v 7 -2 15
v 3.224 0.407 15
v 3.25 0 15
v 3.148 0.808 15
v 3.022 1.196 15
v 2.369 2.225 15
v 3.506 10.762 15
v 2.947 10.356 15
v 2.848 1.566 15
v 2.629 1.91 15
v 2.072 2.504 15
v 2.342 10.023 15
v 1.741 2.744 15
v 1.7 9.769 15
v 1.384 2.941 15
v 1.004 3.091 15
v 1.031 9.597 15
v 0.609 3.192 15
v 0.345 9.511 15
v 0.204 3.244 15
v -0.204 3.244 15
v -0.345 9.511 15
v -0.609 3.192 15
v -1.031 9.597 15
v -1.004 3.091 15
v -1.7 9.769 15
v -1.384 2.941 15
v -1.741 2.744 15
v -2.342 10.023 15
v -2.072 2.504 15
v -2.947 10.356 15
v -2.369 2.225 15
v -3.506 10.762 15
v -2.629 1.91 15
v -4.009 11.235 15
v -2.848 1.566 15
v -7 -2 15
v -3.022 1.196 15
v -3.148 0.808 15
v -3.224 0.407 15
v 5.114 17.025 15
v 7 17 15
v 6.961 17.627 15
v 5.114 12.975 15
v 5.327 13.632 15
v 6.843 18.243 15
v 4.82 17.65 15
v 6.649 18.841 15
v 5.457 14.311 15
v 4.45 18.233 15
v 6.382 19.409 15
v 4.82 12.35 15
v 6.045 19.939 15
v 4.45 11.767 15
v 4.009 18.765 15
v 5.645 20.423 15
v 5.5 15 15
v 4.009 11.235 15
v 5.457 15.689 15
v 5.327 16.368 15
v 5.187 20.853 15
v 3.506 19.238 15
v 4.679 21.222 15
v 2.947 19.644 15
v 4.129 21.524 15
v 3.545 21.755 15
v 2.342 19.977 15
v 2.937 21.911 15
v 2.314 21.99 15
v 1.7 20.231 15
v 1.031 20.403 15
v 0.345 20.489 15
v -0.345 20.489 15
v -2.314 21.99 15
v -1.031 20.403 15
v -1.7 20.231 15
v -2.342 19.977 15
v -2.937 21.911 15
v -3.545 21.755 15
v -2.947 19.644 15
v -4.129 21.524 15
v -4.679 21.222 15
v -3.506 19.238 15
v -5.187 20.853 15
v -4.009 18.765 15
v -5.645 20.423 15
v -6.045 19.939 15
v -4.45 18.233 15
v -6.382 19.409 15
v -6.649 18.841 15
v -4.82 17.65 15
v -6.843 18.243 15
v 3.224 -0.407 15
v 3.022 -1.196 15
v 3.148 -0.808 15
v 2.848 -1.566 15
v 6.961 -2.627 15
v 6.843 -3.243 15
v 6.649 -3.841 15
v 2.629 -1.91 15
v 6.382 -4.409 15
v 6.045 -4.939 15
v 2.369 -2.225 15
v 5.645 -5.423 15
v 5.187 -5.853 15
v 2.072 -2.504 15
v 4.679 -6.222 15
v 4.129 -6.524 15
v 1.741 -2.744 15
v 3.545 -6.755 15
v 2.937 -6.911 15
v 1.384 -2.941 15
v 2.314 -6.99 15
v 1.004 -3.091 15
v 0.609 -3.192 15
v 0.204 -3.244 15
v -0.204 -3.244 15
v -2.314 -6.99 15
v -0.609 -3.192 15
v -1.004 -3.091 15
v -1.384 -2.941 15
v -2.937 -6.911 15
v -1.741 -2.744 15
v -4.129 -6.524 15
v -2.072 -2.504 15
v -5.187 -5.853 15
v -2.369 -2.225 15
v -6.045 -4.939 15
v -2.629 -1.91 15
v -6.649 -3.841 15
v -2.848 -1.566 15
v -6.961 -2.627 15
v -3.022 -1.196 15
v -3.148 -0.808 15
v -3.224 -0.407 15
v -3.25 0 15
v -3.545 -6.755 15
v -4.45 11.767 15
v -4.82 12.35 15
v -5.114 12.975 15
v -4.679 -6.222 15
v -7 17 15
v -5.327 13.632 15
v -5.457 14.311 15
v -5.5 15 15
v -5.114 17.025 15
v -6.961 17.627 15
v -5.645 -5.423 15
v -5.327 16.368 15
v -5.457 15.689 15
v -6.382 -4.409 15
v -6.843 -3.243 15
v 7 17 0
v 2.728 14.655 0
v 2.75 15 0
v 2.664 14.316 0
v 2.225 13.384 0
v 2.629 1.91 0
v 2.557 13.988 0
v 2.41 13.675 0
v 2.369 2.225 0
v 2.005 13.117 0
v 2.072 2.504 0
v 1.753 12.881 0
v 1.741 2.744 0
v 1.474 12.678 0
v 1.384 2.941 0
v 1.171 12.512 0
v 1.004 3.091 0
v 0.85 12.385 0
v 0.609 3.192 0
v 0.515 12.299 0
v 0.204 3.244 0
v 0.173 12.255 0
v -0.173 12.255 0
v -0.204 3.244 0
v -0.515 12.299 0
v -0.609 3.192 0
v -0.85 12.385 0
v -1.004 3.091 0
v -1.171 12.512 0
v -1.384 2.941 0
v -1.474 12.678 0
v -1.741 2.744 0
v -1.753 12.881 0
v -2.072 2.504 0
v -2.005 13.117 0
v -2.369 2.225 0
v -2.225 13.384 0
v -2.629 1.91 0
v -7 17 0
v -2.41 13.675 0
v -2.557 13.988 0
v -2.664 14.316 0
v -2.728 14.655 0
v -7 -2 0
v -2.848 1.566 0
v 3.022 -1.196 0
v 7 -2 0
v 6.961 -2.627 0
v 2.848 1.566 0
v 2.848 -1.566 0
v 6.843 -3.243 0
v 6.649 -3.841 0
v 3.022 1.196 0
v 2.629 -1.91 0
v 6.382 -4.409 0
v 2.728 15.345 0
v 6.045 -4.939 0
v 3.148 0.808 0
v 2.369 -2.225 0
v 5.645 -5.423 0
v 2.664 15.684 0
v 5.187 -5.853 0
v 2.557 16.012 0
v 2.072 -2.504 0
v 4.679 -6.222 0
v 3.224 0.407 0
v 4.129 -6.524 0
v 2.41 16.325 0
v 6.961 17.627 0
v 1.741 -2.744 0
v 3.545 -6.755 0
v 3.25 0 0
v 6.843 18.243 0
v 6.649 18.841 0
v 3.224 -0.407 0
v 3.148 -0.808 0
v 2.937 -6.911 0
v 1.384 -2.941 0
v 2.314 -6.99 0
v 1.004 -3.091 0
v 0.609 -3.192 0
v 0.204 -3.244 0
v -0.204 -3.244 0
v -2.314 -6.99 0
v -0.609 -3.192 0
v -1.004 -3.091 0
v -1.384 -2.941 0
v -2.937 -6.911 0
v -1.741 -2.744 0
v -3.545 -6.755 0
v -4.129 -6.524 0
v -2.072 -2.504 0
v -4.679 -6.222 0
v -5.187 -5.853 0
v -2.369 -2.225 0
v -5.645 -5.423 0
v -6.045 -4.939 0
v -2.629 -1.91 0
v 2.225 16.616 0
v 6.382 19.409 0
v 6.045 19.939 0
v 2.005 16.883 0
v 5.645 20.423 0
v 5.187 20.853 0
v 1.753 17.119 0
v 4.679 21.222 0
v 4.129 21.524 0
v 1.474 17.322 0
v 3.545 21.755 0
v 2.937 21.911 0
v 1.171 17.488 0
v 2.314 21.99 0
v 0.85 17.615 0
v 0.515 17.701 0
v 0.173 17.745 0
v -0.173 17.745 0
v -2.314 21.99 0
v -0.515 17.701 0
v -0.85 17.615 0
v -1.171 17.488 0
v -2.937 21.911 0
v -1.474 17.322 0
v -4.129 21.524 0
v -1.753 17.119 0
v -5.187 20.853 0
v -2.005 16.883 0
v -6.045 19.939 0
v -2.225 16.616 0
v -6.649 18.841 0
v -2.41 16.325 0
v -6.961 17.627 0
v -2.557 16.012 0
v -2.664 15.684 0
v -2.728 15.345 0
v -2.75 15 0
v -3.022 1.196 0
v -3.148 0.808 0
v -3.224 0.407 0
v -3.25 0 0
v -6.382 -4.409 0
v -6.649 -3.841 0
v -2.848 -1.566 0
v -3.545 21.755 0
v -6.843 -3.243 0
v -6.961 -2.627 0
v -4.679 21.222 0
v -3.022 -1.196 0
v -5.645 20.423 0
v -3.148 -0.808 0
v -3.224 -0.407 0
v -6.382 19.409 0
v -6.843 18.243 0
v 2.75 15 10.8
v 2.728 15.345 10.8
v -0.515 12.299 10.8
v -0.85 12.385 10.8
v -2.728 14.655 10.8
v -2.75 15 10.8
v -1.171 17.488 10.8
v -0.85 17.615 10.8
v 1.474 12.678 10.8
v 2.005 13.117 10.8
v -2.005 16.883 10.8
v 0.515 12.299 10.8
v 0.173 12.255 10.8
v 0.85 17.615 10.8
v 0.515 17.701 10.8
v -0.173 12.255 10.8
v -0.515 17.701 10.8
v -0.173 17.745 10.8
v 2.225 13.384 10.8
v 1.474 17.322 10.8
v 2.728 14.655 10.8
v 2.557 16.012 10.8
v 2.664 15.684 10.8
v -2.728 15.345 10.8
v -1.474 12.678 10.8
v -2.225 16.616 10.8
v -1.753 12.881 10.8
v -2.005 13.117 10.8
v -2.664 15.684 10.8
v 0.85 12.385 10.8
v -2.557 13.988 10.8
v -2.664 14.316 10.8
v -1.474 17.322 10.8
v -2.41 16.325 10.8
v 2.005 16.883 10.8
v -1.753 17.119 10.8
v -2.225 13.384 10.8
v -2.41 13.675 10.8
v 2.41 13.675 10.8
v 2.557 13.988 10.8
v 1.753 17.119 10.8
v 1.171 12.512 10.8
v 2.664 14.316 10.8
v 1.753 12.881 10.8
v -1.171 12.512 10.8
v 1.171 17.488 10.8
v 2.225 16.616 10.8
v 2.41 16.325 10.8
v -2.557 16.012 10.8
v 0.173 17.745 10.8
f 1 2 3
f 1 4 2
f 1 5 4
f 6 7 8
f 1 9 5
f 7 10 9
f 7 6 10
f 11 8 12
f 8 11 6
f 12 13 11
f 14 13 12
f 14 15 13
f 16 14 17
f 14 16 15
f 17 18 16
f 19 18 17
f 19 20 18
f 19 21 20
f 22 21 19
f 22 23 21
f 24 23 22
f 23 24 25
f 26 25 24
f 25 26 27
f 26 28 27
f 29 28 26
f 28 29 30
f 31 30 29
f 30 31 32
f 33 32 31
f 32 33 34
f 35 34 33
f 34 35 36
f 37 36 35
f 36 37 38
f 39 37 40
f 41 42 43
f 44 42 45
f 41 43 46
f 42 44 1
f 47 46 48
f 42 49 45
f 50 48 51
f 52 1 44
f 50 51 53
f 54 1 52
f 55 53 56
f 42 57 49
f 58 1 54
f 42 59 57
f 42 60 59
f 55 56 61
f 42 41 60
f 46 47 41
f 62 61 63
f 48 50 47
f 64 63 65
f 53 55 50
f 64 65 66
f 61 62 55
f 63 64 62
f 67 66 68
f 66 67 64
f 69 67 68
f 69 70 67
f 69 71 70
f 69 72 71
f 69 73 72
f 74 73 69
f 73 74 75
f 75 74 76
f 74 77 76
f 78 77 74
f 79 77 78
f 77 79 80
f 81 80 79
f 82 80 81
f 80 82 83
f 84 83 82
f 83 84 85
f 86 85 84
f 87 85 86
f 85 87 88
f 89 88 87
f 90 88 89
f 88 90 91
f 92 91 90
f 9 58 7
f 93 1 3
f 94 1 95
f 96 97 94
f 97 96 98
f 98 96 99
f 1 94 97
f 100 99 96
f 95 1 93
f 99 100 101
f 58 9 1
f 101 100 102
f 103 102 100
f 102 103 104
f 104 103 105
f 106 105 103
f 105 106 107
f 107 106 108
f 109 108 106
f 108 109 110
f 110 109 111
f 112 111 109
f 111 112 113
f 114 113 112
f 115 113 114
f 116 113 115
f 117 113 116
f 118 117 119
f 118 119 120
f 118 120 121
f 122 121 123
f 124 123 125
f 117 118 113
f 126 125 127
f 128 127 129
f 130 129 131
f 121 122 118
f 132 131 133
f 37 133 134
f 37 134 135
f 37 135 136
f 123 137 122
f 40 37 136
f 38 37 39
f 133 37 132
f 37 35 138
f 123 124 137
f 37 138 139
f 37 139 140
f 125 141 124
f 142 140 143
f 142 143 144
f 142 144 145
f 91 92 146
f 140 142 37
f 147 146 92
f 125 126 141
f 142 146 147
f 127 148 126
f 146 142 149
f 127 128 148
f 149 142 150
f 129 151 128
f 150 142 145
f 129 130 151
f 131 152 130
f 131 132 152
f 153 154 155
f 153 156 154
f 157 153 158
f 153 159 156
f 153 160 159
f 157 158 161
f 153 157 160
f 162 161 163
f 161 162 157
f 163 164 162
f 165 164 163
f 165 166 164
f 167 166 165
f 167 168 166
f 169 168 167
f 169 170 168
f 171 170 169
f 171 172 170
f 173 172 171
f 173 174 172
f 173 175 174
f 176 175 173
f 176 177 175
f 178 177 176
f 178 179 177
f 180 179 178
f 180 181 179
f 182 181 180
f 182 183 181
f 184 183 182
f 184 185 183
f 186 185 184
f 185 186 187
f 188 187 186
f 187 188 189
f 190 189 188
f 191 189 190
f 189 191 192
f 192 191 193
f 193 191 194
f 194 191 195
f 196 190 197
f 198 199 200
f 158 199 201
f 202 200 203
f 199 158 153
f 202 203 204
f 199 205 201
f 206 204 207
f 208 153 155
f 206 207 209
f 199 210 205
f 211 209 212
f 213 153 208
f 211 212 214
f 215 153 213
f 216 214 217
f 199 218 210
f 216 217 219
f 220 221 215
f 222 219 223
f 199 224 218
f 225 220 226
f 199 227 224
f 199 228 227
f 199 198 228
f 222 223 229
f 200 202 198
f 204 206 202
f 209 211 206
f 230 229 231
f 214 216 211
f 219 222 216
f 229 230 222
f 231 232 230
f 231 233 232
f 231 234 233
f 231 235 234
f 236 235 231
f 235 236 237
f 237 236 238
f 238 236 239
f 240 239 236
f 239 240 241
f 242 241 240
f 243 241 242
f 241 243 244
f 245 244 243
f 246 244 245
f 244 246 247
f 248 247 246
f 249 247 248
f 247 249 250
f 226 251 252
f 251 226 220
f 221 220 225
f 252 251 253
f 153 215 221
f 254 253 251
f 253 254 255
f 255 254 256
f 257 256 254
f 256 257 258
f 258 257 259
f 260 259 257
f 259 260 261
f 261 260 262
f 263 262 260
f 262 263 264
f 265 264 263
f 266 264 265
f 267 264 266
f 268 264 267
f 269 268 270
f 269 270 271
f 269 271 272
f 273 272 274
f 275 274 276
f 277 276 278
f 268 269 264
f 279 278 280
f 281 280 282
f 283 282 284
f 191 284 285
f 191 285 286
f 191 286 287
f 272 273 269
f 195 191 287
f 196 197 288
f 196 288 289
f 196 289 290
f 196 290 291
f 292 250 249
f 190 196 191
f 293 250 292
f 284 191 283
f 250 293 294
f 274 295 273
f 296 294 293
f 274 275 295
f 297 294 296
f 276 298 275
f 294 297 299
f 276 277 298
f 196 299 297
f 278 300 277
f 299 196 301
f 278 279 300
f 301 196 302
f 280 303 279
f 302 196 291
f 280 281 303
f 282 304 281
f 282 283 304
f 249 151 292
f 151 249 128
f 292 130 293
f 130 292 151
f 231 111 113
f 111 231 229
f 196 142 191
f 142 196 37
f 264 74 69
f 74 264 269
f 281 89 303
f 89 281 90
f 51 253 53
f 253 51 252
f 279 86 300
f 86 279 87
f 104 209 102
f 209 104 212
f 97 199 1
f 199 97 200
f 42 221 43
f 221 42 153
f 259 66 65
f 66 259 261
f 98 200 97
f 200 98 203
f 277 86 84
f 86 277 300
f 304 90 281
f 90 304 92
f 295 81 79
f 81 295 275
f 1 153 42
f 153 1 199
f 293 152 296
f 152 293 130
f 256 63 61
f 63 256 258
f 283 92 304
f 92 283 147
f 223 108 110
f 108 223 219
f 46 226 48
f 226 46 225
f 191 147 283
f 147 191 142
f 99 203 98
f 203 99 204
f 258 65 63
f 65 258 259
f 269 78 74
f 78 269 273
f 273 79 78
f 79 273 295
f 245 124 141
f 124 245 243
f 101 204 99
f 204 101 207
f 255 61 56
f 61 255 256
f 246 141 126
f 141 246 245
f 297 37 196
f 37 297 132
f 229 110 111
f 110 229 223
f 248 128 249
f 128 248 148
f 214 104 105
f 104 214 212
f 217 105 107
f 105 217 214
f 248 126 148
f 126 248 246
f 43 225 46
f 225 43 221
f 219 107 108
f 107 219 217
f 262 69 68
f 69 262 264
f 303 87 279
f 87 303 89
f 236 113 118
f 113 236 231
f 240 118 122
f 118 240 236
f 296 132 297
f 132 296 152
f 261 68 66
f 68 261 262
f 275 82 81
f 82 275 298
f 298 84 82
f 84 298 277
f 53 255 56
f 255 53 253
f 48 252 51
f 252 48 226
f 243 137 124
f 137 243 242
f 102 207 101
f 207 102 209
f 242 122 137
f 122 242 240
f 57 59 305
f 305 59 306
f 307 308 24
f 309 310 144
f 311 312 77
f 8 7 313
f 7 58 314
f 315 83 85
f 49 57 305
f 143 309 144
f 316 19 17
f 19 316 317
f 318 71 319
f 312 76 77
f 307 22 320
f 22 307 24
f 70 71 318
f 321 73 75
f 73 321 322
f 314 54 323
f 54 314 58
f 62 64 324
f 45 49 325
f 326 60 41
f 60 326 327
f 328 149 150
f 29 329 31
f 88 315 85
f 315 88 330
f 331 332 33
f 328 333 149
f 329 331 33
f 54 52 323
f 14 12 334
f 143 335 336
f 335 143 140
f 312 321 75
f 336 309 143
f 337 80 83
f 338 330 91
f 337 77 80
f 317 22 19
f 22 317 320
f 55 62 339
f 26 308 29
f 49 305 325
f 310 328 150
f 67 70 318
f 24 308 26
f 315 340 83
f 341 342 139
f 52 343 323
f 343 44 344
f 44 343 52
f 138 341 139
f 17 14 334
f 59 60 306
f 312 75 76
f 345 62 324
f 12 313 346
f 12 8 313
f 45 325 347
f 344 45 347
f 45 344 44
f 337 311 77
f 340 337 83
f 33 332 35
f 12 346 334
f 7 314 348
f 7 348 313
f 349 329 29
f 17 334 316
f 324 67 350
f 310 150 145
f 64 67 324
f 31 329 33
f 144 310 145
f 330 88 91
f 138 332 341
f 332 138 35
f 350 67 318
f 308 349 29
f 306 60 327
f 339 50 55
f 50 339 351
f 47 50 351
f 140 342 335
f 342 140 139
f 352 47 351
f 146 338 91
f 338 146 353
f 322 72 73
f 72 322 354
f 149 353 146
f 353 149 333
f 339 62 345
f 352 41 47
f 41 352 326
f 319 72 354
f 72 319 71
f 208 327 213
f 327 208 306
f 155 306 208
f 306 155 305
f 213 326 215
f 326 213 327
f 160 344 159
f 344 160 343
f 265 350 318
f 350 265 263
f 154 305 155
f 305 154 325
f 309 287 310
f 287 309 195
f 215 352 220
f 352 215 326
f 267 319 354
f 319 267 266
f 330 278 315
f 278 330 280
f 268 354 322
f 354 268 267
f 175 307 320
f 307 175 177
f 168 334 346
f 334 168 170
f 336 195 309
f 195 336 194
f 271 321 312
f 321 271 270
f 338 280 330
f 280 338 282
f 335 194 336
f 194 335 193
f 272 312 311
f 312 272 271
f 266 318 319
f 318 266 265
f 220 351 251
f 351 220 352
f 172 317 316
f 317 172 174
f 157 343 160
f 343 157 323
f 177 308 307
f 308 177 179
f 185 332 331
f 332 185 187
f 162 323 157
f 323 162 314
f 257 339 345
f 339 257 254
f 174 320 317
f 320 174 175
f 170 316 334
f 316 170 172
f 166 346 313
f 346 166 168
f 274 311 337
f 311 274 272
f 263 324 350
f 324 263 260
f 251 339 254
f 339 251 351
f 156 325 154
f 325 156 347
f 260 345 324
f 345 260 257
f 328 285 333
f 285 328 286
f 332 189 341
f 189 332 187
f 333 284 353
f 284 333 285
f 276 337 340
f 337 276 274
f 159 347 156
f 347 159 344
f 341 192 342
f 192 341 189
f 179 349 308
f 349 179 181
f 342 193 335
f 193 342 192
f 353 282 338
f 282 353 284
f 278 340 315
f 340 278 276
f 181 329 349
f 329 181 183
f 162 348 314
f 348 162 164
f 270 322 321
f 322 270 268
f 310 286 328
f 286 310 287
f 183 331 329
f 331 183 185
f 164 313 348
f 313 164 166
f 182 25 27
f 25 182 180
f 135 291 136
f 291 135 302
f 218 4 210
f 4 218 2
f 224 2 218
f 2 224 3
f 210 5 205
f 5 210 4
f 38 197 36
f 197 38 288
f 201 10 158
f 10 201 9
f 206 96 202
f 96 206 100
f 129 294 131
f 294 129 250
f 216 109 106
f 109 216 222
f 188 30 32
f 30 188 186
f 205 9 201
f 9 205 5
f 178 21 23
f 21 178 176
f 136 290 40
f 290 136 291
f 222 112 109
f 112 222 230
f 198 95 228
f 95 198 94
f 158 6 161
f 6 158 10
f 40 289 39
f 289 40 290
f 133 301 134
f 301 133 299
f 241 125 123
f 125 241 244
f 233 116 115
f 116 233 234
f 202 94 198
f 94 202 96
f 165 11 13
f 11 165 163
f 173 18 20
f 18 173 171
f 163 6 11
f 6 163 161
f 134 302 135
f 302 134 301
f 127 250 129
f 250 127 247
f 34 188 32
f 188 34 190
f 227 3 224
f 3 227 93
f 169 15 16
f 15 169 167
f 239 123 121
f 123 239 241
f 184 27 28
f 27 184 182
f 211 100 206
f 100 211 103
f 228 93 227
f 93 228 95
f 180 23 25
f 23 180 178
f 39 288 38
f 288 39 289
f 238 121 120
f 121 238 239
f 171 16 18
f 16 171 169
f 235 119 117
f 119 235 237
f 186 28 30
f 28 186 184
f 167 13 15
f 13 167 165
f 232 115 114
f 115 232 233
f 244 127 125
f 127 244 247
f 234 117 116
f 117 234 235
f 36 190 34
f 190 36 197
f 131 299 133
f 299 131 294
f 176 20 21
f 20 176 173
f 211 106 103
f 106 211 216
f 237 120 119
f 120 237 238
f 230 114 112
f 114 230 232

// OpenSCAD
$fn = 50;


difference() {
	union() {
		cylinder(h = 15, r = 7.0000000000);
		translate(v = [0.0000000000, 7.5000000000, 0]) {
			hull() {
				translate(v = [-2.0000000000, 9.5000000000, 0]) {
					cylinder(h = 15, r = 5);
				}
				translate(v = [2.0000000000, 9.5000000000, 0]) {
					cylinder(h = 15, r = 5);
				}
				translate(v = [-2.0000000000, -9.5000000000, 0]) {
					cylinder(h = 15, r = 5);
				}
				translate(v = [2.0000000000, -9.5000000000, 0]) {
					cylinder(h = 15, r = 5);
				}
			}
		}
		translate(v = [0.0000000000, 7.5000000000, 0]) {
			hull() {
				translate(v = [-2.0000000000, 9.5000000000, 0]) {
					cylinder(h = 15, r = 5);
				}
				translate(v = [2.0000000000, 9.5000000000, 0]) {
					cylinder(h = 15, r = 5);
				}
				translate(v = [-2.0000000000, -9.5000000000, 0]) {
					cylinder(h = 15, r = 5);
				}
				translate(v = [2.0000000000, -9.5000000000, 0]) {
					cylinder(h = 15, r = 5);
				}
			}
		}
	}
	union() {
		translate(v = [0.0000000000, 15.0000000000, 15]) {
			rotate(a = [0, 0, 0]) {
				difference() {
					union() {
						#translate(v = [0, 0, -15.0000000000]) {
							cylinder(h = 15, r = 2.2500000000);
						}
						#translate(v = [0, 0, -4.2000000000]) {
							cylinder(h = 4.2000000000, r1 = 2.7500000000, r2 = 5.5000000000);
						}
						#translate(v = [0, 0, -15.0000000000]) {
							cylinder(h = 15, r = 2.7500000000);
						}
						#translate(v = [0, 0, -15.0000000000]) {
							cylinder(h = 15, r = 2.2500000000);
						}
					}
					union();
				}
			}
		}
		translate(v = [0.0000000000, 15.0000000000, 15]) {
			rotate(a = [0, 0, 0]) {
				difference() {
					union() {
						#translate(v = [0, 0, -15.0000000000]) {
							cylinder(h = 15, r = 2.2500000000);
						}
						#translate(v = [0, 0, -4.2000000000]) {
							cylinder(h = 4.2000000000, r1 = 2.7500000000, r2 = 5.5000000000);
						}
						#translate(v = [0, 0, -15.0000000000]) {
							cylinder(h = 15, r = 2.7500000000);
						}
						#translate(v = [0, 0, -15.0000000000]) {
							cylinder(h = 15, r = 2.2500000000);
						}
					}
					union();
				}
			}
		}
		translate(v = [0, 0, -100]) {
			cylinder(h = 200, r = 3.2500000000);
		}
		translate(v = [0, 0, -100]) {
			cylinder(h = 200, r = 1.8000000000);
		}
	}
}
